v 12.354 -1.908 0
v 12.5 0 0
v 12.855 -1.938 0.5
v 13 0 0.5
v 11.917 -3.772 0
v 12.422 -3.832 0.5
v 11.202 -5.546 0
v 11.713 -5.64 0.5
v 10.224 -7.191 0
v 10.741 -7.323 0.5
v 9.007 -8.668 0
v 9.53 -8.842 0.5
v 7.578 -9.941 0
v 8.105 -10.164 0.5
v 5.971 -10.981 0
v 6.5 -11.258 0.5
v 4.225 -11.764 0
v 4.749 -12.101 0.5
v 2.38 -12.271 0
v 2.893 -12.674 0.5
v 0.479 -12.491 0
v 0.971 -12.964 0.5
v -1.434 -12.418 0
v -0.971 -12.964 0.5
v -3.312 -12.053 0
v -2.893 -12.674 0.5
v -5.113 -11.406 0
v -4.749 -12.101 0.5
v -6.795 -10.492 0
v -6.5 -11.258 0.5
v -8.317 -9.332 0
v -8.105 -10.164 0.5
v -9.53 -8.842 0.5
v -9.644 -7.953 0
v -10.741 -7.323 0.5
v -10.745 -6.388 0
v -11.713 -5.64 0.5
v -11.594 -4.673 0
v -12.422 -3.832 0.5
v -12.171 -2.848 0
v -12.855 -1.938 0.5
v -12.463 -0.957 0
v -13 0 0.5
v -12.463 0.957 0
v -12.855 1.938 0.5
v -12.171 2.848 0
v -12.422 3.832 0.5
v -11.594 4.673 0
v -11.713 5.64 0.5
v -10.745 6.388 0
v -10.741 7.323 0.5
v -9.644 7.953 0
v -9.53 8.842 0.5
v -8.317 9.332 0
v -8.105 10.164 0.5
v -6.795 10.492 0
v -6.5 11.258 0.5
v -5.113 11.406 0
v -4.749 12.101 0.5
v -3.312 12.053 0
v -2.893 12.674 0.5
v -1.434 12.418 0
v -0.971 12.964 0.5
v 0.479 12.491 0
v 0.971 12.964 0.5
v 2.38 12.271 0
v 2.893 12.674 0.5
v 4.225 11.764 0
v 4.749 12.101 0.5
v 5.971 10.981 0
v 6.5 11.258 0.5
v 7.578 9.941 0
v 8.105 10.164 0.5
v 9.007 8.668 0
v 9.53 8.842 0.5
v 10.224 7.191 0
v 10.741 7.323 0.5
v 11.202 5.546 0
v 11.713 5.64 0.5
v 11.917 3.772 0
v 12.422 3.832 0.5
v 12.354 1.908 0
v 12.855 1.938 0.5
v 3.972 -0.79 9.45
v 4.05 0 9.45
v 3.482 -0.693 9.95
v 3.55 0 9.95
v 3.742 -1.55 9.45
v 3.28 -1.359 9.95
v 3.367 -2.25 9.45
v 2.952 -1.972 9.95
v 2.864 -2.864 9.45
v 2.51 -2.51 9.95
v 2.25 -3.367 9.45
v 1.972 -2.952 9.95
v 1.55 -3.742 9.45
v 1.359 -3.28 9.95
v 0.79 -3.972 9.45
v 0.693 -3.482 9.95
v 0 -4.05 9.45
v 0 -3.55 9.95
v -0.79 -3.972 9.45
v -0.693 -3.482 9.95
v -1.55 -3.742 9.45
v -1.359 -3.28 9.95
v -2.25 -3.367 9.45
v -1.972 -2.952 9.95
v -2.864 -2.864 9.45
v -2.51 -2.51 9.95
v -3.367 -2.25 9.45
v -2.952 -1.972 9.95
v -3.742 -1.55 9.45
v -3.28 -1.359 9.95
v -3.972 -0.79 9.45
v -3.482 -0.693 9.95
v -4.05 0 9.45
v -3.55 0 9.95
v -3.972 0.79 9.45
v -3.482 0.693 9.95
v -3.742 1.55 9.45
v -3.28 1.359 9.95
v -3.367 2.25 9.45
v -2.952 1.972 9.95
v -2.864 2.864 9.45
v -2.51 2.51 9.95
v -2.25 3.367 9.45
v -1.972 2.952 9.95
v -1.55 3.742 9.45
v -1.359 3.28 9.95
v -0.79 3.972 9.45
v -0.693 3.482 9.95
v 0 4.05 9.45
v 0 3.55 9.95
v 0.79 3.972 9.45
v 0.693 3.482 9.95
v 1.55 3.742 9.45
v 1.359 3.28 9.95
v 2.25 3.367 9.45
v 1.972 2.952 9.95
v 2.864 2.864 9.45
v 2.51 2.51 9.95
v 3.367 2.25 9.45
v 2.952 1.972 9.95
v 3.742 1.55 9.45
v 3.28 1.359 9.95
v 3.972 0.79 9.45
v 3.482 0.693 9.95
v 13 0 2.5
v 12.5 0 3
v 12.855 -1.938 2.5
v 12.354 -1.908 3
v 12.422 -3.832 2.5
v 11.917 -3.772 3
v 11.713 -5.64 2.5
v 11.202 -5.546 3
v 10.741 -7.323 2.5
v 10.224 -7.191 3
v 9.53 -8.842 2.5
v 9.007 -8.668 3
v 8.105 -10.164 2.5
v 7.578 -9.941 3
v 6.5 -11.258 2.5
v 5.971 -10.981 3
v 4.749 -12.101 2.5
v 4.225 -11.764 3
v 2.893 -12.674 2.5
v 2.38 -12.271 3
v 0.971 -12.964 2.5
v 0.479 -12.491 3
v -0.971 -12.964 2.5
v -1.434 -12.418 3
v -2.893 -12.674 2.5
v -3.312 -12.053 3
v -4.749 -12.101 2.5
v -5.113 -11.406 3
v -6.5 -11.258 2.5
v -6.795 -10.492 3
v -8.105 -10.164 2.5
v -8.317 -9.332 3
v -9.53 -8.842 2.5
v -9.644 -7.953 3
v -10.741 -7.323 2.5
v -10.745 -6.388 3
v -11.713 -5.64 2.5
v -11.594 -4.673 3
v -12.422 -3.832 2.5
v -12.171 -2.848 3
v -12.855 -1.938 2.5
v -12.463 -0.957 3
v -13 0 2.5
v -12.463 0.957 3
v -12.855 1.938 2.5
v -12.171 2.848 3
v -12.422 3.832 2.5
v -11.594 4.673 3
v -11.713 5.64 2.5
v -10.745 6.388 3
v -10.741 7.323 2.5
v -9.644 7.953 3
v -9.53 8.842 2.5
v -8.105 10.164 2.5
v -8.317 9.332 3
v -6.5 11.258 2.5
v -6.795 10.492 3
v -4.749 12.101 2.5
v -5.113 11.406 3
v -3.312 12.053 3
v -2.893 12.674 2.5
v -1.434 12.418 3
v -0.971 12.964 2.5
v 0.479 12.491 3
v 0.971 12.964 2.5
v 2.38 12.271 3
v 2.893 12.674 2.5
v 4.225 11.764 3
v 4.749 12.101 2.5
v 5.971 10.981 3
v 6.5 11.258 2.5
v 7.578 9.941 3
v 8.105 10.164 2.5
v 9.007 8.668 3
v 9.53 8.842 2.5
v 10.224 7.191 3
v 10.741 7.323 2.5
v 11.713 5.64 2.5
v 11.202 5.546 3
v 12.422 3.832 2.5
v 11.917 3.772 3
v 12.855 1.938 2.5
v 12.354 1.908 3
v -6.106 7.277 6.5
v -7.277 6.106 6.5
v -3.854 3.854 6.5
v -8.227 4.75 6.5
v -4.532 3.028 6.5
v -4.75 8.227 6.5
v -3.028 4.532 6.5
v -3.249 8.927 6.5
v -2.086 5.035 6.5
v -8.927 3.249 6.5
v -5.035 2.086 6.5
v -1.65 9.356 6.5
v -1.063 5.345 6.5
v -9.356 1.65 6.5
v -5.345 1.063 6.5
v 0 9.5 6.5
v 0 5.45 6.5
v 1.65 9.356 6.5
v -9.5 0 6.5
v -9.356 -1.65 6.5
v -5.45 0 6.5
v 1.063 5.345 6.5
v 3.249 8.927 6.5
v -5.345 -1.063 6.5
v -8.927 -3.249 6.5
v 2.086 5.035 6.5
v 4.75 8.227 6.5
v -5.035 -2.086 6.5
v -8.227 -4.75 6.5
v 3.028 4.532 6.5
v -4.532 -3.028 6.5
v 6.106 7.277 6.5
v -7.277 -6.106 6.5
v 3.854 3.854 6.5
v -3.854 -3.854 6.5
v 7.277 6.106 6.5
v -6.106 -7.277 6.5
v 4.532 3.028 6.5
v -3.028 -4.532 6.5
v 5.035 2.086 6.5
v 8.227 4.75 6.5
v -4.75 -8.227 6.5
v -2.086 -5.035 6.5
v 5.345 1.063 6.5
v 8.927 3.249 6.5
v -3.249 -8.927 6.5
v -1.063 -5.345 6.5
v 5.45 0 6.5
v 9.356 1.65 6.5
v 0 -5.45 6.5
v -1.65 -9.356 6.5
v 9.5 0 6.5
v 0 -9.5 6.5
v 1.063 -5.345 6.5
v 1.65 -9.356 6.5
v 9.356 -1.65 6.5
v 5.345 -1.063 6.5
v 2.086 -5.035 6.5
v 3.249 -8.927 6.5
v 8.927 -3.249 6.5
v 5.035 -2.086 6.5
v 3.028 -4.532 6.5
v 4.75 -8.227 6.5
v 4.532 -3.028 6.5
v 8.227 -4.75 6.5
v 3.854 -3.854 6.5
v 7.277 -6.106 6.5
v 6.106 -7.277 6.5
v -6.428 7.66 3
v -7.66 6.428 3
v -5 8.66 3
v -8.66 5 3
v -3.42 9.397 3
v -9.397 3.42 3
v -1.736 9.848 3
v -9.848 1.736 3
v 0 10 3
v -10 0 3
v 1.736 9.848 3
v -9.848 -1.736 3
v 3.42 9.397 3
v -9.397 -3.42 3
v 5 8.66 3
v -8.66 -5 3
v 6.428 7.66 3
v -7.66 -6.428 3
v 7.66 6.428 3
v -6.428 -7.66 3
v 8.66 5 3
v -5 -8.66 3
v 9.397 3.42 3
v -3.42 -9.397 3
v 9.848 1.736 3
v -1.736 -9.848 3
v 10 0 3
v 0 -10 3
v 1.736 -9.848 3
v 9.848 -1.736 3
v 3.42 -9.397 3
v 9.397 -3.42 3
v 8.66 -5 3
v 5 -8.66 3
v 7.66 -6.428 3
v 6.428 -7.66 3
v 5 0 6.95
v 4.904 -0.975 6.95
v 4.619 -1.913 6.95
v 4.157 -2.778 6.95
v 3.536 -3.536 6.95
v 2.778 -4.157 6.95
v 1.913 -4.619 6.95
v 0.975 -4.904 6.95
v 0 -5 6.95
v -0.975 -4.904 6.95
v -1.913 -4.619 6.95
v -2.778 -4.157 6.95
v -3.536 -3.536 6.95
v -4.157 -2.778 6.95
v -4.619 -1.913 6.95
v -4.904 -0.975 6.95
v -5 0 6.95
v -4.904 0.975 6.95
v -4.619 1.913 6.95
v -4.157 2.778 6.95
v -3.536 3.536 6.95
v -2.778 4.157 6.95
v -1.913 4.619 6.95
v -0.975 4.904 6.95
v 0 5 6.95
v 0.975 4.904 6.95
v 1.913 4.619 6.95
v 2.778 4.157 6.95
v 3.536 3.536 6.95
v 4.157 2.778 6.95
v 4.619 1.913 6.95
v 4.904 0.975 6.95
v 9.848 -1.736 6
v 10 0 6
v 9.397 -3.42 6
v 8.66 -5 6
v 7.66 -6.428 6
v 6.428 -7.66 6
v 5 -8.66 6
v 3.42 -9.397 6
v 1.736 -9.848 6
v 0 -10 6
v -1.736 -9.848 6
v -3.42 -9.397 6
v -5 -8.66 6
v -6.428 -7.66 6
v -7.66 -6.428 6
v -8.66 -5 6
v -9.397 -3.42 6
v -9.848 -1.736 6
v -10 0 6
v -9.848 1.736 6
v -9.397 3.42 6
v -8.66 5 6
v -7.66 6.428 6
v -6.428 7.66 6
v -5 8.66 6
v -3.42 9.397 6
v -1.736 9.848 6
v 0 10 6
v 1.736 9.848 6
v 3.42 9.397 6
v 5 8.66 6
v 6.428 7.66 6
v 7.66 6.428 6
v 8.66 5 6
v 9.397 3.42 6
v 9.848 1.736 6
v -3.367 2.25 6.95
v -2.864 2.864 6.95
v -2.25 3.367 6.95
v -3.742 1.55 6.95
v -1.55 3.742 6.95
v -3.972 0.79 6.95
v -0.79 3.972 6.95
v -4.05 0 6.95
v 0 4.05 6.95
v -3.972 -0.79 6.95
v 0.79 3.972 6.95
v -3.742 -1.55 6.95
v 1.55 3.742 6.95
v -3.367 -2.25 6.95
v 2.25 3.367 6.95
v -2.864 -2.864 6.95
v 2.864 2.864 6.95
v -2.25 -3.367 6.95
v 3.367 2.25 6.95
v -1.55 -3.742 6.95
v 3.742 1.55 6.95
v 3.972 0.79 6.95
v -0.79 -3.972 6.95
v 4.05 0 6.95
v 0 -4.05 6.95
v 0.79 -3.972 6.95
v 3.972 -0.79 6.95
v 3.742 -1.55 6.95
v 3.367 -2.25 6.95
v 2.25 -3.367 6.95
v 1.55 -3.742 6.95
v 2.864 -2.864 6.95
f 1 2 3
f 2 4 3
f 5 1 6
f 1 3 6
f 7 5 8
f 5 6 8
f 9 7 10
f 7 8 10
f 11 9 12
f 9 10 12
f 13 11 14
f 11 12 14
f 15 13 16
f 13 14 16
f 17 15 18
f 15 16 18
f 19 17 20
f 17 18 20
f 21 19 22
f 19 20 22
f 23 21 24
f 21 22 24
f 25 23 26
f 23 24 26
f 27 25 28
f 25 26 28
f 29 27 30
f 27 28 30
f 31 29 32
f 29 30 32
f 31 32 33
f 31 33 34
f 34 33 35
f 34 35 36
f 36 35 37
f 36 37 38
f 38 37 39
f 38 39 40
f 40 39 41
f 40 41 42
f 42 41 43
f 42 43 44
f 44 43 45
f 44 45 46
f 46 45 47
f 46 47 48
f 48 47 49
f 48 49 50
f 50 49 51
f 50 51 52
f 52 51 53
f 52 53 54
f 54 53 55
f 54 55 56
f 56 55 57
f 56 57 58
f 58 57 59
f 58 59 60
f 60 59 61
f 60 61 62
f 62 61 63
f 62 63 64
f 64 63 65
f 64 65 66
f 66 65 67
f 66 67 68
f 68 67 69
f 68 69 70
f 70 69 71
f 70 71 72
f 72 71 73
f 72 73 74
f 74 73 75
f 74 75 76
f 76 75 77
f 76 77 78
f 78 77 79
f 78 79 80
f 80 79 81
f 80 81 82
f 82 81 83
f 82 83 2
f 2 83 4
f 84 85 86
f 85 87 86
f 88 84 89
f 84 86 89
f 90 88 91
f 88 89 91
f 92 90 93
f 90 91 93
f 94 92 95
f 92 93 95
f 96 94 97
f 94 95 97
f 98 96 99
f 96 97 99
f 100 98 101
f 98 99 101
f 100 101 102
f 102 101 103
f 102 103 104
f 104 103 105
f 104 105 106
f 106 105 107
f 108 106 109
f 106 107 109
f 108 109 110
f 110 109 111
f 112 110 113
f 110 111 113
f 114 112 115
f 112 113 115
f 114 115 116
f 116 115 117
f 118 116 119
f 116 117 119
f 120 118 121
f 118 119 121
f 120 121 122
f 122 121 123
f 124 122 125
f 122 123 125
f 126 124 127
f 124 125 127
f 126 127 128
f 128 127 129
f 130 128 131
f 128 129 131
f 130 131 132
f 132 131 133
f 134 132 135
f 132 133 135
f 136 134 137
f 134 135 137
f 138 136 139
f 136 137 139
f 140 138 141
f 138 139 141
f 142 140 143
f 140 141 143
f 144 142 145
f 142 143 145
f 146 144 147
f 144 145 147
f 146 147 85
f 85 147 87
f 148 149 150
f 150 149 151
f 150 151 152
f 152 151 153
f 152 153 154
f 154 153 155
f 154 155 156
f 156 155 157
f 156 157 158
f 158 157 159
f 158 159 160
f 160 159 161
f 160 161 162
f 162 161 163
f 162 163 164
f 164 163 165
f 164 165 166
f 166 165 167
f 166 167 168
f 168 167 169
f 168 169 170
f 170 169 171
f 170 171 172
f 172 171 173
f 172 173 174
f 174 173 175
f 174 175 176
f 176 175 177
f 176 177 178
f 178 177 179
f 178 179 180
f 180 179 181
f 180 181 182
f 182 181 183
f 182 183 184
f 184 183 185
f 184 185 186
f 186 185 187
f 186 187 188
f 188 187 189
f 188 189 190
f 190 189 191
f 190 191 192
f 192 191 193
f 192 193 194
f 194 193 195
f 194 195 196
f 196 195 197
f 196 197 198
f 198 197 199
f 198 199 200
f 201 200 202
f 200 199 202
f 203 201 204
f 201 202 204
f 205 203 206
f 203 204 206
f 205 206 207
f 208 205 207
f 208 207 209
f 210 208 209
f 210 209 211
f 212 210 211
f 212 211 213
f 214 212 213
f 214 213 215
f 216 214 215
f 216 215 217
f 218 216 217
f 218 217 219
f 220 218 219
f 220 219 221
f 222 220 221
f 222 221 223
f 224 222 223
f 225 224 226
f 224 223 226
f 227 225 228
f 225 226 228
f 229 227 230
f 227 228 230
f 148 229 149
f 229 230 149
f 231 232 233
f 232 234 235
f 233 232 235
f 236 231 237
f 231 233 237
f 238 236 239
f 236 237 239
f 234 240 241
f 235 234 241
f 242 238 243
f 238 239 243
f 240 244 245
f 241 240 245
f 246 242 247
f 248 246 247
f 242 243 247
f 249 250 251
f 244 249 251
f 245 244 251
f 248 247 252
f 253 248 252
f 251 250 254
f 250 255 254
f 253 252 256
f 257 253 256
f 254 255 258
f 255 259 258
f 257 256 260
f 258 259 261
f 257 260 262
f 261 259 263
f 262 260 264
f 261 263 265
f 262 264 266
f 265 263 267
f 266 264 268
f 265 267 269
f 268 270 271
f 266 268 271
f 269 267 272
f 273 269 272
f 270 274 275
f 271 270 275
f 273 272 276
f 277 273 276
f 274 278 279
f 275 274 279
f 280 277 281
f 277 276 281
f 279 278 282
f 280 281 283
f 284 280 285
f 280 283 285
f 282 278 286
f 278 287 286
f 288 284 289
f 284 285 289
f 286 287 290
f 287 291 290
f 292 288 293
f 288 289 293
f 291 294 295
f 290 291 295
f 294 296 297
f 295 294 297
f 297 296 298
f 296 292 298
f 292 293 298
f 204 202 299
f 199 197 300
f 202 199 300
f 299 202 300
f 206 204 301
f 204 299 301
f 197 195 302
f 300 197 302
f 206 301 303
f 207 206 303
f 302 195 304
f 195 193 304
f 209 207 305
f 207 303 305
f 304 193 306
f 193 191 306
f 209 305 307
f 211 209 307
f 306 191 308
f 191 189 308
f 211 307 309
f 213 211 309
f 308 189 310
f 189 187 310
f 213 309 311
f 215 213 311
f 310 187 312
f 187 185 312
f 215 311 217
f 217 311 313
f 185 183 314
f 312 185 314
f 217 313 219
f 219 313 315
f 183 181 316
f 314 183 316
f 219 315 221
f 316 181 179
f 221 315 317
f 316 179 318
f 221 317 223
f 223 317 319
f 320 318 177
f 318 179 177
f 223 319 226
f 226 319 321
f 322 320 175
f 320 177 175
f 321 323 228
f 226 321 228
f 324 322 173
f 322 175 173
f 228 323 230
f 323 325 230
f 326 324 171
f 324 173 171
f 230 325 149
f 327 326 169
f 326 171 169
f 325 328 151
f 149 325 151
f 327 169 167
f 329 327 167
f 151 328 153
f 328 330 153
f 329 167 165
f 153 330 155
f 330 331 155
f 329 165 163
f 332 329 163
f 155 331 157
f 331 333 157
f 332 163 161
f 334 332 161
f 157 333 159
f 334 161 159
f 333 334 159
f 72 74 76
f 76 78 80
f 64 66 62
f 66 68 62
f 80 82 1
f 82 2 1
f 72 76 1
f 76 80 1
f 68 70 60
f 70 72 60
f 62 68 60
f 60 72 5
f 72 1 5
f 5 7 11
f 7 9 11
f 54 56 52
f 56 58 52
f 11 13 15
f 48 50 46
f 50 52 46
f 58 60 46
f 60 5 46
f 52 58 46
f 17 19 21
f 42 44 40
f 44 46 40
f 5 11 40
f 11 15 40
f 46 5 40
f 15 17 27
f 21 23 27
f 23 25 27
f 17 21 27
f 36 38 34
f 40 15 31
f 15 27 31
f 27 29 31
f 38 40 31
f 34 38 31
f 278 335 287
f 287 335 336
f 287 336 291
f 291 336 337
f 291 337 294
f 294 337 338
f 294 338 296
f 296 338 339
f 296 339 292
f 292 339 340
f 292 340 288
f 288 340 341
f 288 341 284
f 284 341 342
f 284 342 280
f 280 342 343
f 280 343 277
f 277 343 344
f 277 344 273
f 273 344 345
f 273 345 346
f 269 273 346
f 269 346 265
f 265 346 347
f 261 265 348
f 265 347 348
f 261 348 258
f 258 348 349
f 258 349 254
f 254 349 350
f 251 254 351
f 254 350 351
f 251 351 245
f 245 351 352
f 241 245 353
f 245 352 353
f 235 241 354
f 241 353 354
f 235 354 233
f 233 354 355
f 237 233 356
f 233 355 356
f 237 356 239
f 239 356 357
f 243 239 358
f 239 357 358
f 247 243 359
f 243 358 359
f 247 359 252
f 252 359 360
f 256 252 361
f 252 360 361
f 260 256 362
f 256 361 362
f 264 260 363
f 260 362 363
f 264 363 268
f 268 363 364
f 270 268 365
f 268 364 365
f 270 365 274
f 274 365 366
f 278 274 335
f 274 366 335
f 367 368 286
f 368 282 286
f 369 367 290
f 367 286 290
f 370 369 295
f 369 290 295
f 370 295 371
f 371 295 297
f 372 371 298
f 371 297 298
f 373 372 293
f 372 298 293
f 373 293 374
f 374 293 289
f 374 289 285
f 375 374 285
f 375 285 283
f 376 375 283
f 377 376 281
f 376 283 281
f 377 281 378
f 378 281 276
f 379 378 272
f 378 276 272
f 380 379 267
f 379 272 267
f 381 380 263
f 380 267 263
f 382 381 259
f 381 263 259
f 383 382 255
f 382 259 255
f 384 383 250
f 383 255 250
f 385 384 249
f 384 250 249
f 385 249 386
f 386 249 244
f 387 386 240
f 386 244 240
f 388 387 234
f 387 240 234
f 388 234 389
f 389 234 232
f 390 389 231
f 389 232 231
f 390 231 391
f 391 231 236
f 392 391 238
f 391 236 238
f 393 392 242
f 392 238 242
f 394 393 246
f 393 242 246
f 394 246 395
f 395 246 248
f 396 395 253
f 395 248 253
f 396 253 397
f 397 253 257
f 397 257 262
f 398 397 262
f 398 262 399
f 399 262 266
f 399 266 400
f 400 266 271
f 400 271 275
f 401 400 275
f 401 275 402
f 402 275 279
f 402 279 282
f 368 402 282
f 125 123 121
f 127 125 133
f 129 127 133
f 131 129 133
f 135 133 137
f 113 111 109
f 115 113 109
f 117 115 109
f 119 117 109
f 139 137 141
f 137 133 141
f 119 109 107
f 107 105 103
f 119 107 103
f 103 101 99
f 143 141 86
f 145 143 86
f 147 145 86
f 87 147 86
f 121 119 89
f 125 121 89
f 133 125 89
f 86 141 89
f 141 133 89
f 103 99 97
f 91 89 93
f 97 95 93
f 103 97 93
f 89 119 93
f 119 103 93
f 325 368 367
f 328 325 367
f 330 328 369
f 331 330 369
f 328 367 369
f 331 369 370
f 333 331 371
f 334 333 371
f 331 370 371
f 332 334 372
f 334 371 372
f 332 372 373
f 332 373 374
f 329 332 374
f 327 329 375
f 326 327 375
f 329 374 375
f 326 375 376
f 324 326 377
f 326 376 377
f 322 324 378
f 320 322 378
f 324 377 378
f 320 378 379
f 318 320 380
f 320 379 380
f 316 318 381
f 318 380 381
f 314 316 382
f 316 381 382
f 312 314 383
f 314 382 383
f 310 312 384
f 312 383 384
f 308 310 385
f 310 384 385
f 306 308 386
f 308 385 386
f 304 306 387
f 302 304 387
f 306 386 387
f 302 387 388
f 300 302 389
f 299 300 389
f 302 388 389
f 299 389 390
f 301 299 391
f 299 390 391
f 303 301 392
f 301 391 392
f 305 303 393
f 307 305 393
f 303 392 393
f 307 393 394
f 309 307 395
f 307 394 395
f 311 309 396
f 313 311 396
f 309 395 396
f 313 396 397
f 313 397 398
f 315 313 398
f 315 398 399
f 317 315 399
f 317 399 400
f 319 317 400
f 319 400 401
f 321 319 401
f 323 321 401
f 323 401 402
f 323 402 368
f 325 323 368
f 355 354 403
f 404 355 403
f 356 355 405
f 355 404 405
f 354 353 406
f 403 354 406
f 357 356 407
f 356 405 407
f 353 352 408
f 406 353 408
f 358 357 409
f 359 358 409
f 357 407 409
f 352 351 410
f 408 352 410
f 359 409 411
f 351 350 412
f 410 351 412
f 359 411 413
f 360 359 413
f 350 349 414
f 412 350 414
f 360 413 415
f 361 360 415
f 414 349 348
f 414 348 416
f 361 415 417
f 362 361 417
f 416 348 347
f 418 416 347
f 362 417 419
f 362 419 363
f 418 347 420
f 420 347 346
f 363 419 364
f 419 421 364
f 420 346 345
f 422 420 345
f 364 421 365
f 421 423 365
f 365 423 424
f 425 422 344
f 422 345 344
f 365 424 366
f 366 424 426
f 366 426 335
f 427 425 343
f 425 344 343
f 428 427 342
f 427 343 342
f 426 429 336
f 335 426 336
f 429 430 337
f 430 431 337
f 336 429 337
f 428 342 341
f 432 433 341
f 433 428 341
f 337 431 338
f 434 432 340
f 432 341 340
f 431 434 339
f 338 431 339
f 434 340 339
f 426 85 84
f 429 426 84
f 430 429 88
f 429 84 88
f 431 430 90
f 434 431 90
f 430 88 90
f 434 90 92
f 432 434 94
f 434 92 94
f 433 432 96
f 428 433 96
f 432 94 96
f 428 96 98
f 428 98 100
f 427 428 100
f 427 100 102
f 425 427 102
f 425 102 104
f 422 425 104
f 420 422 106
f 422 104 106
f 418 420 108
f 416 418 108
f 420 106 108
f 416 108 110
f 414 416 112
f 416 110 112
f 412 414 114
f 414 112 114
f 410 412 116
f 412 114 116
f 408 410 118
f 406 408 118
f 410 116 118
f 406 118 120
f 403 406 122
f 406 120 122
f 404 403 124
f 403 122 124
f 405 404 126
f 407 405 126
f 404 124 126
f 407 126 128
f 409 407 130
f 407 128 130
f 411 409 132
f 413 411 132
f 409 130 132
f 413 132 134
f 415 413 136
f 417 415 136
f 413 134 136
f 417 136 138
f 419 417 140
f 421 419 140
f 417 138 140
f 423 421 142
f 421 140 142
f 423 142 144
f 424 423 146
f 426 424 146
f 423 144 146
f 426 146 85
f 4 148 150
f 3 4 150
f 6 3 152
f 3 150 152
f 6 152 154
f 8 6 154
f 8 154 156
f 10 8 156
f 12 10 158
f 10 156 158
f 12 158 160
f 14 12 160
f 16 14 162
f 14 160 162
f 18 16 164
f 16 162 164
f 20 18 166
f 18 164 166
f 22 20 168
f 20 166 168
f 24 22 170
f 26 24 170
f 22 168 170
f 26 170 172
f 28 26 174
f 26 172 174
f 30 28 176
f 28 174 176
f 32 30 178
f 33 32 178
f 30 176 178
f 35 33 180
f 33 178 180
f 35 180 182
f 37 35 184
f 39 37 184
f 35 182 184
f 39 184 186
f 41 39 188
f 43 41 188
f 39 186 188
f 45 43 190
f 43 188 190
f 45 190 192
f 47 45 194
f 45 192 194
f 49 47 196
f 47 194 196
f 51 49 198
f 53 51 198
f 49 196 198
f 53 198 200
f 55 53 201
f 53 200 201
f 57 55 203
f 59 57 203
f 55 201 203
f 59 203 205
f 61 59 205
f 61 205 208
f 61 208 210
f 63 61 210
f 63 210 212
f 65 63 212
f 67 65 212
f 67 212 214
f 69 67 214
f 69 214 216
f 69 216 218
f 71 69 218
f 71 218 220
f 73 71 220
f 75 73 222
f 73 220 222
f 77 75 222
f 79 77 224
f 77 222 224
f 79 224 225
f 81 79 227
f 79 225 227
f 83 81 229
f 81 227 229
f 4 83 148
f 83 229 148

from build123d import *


# Not quite as in the source:
# - a fillet or chamfer that OpenCascade refuses, or shapes differently, is made with other operations: its cross-section is extruded or revolved along the edge and cut away or added


with BuildPart() as f1:
    # F0 (on Front) → F1 (revolve)
    with BuildSketch(Plane.XZ):
        Polygon((0, 9.95), (0, 0), (13, 0), (13, 3), (10, 3), (10, 6.5), (5.5, 6.5), (5.5, 6.95), (4.05, 6.95), (4.05, 9.95), align=None)
    revolve(axis=Axis((0, 0, 4.975), (0, 0, -1)))

    # F2: chamfer of 0.5 on 5 edges, made by hand

    # F2_s1 → F2_t2 (revolve, cut)
    with BuildSketch(Plane.XZ):
        Polygon((12.5, 0), (13, 0.5), (13, 0), align=None)
    revolve(axis=Axis((0, 0, 0), (0, 0, -1)), mode=Mode.SUBTRACT)

    # F2_s3 → F2_t4 (revolve, cut)
    with BuildSketch(Plane.XZ):
        Polygon((13, 2.5), (12.5, 3), (13, 3), align=None)
    revolve(axis=Axis((0, 0, 3), (0, 0, -1)), mode=Mode.SUBTRACT)

    # F2_s5 → F2_t6 (revolve, cut)
    with BuildSketch(Plane.XZ):
        Polygon((10, 6), (9.5, 6.5), (10, 6.5), align=None)
    revolve(axis=Axis((0, 0, 6.5), (0, 0, -1)), mode=Mode.SUBTRACT)


with BuildPart() as f2_tool8:
    # F2_s9 → F2_t10 (revolve)
    with BuildSketch(Plane.XZ):
        Polygon((5.5, 6.45), (5, 6.95), (5.5, 6.95), align=None)
    revolve(axis=Axis((0, 0, 6.95), (0, 0, -1)))

    split(bisect_by=Plane.XY.offset(6.5), keep=Keep.TOP)


with BuildPart() as f1_1:
    add(f1.part)

    # F2_t7: cut F2_tool8
    add(f2_tool8.part, mode=Mode.SUBTRACT)

    # F2_s12 → F2_t13 (revolve, cut)
    with BuildSketch(Plane.XZ):
        Polygon((4.05, 9.45), (3.55, 9.95), (4.05, 9.95), align=None)
    revolve(axis=Axis((0, 0, 9.95), (0, 0, -1)), mode=Mode.SUBTRACT)


solid = f1_1.part
